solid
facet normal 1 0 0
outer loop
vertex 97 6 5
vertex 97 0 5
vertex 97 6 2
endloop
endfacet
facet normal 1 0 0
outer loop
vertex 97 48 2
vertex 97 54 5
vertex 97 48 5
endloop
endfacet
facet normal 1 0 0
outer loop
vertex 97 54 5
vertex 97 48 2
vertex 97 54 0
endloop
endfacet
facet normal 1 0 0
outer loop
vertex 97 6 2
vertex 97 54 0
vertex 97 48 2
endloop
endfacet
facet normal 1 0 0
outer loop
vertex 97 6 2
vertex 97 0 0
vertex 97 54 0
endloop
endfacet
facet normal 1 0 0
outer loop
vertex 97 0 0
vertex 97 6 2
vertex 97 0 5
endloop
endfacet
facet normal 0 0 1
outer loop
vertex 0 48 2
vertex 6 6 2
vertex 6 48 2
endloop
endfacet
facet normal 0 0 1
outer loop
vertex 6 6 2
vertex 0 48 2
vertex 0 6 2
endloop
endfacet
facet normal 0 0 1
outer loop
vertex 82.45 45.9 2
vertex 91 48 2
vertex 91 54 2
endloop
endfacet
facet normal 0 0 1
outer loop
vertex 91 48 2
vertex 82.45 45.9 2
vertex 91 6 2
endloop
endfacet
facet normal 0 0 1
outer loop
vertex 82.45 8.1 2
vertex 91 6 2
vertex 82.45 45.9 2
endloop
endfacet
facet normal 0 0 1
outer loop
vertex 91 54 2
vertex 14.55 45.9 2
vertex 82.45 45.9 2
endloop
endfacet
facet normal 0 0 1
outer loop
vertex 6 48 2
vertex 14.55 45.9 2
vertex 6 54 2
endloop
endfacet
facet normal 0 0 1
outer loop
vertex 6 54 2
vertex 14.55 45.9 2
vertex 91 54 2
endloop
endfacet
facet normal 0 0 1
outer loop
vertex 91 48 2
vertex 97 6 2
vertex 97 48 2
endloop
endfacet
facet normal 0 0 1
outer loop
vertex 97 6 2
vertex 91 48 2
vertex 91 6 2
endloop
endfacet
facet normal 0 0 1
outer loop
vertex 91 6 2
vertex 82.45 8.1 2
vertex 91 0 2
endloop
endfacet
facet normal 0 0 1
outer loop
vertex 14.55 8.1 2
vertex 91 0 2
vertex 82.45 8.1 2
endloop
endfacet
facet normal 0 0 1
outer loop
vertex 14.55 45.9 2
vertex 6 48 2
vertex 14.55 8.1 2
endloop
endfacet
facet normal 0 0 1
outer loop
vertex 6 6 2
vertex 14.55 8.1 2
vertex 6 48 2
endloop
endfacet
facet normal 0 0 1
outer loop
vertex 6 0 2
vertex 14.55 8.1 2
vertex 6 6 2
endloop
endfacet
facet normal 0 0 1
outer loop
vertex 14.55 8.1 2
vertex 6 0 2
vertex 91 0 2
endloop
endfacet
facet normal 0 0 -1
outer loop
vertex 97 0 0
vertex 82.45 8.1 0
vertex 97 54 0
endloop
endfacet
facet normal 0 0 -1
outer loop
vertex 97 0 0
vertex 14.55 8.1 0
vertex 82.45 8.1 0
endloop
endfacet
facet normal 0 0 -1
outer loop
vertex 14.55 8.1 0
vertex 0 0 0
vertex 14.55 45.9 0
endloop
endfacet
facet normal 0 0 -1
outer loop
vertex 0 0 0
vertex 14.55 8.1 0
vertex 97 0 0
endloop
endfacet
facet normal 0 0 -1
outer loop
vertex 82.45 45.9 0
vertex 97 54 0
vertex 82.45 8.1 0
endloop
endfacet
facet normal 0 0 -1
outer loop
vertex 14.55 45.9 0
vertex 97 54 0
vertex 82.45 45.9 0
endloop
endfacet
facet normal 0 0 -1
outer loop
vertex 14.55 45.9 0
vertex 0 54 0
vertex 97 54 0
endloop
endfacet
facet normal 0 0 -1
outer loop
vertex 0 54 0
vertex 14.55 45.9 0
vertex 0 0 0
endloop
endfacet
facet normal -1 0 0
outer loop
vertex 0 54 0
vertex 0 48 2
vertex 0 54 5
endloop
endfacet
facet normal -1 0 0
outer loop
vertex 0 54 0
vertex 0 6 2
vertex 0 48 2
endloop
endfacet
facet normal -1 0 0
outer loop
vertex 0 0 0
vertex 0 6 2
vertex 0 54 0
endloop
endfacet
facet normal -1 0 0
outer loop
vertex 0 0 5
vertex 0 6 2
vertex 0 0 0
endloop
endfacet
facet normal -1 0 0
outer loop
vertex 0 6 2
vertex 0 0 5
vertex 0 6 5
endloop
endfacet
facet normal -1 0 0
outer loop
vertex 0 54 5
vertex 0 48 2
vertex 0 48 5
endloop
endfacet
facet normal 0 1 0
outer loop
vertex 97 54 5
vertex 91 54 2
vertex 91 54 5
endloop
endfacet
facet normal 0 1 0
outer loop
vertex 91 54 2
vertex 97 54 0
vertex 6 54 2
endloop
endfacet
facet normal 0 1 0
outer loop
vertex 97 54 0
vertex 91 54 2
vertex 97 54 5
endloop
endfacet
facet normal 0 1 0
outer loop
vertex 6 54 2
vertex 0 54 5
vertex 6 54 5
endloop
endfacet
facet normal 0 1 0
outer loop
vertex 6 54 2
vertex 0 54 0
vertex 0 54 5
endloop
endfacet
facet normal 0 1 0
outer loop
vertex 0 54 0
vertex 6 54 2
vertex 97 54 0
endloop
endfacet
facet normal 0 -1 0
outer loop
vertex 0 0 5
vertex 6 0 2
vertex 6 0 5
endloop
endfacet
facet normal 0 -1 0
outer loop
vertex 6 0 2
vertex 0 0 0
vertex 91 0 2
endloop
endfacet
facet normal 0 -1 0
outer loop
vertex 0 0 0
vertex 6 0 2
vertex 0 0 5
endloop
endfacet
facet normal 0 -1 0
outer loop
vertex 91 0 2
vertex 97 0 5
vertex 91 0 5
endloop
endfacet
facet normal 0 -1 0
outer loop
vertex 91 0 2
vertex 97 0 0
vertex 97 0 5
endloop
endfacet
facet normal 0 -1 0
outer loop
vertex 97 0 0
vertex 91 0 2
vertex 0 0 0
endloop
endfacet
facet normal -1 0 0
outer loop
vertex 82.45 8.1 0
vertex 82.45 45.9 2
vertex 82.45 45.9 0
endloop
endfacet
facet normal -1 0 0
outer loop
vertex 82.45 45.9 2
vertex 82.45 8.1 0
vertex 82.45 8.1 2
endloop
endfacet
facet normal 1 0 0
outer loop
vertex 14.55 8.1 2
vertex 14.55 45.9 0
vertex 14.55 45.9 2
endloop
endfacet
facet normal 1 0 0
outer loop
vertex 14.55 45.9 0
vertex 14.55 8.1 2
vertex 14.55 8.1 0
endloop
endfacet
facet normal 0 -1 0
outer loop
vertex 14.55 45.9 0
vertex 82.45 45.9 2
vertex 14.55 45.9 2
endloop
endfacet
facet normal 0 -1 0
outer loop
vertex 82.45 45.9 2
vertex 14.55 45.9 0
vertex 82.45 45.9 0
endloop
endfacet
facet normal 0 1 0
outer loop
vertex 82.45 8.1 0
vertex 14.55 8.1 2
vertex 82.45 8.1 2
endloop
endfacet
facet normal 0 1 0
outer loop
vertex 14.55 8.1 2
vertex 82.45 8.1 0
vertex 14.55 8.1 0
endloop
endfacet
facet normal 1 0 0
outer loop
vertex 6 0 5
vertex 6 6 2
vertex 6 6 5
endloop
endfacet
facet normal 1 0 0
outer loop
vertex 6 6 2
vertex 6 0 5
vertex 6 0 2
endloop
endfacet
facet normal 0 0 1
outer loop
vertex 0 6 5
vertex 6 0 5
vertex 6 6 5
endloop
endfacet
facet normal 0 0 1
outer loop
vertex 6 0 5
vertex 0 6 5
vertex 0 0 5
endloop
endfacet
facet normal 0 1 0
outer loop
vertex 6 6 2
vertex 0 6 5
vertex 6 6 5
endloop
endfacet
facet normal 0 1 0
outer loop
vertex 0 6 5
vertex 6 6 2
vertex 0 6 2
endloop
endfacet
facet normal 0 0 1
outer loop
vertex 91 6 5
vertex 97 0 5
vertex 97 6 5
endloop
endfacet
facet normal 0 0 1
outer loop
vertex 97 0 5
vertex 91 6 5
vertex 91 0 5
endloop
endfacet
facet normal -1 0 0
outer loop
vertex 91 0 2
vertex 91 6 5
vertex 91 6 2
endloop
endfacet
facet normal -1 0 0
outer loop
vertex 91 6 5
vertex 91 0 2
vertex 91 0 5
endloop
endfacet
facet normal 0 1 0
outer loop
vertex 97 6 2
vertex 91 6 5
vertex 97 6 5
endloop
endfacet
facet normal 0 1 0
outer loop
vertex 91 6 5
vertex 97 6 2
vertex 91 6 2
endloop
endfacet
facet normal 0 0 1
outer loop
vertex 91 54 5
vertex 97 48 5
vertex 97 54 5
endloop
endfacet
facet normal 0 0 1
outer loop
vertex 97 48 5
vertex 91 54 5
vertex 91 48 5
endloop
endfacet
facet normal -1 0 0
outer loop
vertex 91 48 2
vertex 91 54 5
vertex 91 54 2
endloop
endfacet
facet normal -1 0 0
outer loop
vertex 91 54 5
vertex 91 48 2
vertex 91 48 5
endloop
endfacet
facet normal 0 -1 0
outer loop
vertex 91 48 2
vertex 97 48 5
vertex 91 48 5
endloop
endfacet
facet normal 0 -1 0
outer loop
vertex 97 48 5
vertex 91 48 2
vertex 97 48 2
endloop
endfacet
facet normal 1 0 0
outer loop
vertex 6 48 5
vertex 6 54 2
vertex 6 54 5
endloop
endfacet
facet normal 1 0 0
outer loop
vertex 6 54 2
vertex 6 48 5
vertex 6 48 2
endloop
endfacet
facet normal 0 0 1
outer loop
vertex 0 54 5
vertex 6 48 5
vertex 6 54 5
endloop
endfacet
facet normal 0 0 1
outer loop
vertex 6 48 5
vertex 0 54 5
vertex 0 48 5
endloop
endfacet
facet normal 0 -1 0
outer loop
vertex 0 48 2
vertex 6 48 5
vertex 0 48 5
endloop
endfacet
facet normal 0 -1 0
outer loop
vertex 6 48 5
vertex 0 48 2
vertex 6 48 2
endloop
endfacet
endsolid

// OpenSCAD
// LetterBlock.scad - Basic usage of text() and linear_extrude()
// Module instantiation
myblock(2,97,54,6,3);

// Module definition.
// size=30 defines an optional parameter with a default value.
module myblock(height,width,depth, standoff_width, standoff_height) {
    translate([0,0,height]) cube([standoff_width,standoff_width,standoff_height]);
    translate([width-standoff_width,0,height]) cube([standoff_width,standoff_width,standoff_height]);
    translate([width-standoff_width,depth-standoff_width,height]) cube([standoff_width,standoff_width,standoff_height]);
    translate([0,depth-standoff_width,height]) cube([standoff_width,standoff_width,standoff_height]);
    hole_percentage=0.7;
    difference (){
        translate([0,0,0]) cube([width,depth,height]);
        translate([width/2-width*hole_percentage/2,depth/2-depth*hole_percentage/2,0]) cube([width*hole_percentage,depth*hole_percentage,height]);

   }
}
